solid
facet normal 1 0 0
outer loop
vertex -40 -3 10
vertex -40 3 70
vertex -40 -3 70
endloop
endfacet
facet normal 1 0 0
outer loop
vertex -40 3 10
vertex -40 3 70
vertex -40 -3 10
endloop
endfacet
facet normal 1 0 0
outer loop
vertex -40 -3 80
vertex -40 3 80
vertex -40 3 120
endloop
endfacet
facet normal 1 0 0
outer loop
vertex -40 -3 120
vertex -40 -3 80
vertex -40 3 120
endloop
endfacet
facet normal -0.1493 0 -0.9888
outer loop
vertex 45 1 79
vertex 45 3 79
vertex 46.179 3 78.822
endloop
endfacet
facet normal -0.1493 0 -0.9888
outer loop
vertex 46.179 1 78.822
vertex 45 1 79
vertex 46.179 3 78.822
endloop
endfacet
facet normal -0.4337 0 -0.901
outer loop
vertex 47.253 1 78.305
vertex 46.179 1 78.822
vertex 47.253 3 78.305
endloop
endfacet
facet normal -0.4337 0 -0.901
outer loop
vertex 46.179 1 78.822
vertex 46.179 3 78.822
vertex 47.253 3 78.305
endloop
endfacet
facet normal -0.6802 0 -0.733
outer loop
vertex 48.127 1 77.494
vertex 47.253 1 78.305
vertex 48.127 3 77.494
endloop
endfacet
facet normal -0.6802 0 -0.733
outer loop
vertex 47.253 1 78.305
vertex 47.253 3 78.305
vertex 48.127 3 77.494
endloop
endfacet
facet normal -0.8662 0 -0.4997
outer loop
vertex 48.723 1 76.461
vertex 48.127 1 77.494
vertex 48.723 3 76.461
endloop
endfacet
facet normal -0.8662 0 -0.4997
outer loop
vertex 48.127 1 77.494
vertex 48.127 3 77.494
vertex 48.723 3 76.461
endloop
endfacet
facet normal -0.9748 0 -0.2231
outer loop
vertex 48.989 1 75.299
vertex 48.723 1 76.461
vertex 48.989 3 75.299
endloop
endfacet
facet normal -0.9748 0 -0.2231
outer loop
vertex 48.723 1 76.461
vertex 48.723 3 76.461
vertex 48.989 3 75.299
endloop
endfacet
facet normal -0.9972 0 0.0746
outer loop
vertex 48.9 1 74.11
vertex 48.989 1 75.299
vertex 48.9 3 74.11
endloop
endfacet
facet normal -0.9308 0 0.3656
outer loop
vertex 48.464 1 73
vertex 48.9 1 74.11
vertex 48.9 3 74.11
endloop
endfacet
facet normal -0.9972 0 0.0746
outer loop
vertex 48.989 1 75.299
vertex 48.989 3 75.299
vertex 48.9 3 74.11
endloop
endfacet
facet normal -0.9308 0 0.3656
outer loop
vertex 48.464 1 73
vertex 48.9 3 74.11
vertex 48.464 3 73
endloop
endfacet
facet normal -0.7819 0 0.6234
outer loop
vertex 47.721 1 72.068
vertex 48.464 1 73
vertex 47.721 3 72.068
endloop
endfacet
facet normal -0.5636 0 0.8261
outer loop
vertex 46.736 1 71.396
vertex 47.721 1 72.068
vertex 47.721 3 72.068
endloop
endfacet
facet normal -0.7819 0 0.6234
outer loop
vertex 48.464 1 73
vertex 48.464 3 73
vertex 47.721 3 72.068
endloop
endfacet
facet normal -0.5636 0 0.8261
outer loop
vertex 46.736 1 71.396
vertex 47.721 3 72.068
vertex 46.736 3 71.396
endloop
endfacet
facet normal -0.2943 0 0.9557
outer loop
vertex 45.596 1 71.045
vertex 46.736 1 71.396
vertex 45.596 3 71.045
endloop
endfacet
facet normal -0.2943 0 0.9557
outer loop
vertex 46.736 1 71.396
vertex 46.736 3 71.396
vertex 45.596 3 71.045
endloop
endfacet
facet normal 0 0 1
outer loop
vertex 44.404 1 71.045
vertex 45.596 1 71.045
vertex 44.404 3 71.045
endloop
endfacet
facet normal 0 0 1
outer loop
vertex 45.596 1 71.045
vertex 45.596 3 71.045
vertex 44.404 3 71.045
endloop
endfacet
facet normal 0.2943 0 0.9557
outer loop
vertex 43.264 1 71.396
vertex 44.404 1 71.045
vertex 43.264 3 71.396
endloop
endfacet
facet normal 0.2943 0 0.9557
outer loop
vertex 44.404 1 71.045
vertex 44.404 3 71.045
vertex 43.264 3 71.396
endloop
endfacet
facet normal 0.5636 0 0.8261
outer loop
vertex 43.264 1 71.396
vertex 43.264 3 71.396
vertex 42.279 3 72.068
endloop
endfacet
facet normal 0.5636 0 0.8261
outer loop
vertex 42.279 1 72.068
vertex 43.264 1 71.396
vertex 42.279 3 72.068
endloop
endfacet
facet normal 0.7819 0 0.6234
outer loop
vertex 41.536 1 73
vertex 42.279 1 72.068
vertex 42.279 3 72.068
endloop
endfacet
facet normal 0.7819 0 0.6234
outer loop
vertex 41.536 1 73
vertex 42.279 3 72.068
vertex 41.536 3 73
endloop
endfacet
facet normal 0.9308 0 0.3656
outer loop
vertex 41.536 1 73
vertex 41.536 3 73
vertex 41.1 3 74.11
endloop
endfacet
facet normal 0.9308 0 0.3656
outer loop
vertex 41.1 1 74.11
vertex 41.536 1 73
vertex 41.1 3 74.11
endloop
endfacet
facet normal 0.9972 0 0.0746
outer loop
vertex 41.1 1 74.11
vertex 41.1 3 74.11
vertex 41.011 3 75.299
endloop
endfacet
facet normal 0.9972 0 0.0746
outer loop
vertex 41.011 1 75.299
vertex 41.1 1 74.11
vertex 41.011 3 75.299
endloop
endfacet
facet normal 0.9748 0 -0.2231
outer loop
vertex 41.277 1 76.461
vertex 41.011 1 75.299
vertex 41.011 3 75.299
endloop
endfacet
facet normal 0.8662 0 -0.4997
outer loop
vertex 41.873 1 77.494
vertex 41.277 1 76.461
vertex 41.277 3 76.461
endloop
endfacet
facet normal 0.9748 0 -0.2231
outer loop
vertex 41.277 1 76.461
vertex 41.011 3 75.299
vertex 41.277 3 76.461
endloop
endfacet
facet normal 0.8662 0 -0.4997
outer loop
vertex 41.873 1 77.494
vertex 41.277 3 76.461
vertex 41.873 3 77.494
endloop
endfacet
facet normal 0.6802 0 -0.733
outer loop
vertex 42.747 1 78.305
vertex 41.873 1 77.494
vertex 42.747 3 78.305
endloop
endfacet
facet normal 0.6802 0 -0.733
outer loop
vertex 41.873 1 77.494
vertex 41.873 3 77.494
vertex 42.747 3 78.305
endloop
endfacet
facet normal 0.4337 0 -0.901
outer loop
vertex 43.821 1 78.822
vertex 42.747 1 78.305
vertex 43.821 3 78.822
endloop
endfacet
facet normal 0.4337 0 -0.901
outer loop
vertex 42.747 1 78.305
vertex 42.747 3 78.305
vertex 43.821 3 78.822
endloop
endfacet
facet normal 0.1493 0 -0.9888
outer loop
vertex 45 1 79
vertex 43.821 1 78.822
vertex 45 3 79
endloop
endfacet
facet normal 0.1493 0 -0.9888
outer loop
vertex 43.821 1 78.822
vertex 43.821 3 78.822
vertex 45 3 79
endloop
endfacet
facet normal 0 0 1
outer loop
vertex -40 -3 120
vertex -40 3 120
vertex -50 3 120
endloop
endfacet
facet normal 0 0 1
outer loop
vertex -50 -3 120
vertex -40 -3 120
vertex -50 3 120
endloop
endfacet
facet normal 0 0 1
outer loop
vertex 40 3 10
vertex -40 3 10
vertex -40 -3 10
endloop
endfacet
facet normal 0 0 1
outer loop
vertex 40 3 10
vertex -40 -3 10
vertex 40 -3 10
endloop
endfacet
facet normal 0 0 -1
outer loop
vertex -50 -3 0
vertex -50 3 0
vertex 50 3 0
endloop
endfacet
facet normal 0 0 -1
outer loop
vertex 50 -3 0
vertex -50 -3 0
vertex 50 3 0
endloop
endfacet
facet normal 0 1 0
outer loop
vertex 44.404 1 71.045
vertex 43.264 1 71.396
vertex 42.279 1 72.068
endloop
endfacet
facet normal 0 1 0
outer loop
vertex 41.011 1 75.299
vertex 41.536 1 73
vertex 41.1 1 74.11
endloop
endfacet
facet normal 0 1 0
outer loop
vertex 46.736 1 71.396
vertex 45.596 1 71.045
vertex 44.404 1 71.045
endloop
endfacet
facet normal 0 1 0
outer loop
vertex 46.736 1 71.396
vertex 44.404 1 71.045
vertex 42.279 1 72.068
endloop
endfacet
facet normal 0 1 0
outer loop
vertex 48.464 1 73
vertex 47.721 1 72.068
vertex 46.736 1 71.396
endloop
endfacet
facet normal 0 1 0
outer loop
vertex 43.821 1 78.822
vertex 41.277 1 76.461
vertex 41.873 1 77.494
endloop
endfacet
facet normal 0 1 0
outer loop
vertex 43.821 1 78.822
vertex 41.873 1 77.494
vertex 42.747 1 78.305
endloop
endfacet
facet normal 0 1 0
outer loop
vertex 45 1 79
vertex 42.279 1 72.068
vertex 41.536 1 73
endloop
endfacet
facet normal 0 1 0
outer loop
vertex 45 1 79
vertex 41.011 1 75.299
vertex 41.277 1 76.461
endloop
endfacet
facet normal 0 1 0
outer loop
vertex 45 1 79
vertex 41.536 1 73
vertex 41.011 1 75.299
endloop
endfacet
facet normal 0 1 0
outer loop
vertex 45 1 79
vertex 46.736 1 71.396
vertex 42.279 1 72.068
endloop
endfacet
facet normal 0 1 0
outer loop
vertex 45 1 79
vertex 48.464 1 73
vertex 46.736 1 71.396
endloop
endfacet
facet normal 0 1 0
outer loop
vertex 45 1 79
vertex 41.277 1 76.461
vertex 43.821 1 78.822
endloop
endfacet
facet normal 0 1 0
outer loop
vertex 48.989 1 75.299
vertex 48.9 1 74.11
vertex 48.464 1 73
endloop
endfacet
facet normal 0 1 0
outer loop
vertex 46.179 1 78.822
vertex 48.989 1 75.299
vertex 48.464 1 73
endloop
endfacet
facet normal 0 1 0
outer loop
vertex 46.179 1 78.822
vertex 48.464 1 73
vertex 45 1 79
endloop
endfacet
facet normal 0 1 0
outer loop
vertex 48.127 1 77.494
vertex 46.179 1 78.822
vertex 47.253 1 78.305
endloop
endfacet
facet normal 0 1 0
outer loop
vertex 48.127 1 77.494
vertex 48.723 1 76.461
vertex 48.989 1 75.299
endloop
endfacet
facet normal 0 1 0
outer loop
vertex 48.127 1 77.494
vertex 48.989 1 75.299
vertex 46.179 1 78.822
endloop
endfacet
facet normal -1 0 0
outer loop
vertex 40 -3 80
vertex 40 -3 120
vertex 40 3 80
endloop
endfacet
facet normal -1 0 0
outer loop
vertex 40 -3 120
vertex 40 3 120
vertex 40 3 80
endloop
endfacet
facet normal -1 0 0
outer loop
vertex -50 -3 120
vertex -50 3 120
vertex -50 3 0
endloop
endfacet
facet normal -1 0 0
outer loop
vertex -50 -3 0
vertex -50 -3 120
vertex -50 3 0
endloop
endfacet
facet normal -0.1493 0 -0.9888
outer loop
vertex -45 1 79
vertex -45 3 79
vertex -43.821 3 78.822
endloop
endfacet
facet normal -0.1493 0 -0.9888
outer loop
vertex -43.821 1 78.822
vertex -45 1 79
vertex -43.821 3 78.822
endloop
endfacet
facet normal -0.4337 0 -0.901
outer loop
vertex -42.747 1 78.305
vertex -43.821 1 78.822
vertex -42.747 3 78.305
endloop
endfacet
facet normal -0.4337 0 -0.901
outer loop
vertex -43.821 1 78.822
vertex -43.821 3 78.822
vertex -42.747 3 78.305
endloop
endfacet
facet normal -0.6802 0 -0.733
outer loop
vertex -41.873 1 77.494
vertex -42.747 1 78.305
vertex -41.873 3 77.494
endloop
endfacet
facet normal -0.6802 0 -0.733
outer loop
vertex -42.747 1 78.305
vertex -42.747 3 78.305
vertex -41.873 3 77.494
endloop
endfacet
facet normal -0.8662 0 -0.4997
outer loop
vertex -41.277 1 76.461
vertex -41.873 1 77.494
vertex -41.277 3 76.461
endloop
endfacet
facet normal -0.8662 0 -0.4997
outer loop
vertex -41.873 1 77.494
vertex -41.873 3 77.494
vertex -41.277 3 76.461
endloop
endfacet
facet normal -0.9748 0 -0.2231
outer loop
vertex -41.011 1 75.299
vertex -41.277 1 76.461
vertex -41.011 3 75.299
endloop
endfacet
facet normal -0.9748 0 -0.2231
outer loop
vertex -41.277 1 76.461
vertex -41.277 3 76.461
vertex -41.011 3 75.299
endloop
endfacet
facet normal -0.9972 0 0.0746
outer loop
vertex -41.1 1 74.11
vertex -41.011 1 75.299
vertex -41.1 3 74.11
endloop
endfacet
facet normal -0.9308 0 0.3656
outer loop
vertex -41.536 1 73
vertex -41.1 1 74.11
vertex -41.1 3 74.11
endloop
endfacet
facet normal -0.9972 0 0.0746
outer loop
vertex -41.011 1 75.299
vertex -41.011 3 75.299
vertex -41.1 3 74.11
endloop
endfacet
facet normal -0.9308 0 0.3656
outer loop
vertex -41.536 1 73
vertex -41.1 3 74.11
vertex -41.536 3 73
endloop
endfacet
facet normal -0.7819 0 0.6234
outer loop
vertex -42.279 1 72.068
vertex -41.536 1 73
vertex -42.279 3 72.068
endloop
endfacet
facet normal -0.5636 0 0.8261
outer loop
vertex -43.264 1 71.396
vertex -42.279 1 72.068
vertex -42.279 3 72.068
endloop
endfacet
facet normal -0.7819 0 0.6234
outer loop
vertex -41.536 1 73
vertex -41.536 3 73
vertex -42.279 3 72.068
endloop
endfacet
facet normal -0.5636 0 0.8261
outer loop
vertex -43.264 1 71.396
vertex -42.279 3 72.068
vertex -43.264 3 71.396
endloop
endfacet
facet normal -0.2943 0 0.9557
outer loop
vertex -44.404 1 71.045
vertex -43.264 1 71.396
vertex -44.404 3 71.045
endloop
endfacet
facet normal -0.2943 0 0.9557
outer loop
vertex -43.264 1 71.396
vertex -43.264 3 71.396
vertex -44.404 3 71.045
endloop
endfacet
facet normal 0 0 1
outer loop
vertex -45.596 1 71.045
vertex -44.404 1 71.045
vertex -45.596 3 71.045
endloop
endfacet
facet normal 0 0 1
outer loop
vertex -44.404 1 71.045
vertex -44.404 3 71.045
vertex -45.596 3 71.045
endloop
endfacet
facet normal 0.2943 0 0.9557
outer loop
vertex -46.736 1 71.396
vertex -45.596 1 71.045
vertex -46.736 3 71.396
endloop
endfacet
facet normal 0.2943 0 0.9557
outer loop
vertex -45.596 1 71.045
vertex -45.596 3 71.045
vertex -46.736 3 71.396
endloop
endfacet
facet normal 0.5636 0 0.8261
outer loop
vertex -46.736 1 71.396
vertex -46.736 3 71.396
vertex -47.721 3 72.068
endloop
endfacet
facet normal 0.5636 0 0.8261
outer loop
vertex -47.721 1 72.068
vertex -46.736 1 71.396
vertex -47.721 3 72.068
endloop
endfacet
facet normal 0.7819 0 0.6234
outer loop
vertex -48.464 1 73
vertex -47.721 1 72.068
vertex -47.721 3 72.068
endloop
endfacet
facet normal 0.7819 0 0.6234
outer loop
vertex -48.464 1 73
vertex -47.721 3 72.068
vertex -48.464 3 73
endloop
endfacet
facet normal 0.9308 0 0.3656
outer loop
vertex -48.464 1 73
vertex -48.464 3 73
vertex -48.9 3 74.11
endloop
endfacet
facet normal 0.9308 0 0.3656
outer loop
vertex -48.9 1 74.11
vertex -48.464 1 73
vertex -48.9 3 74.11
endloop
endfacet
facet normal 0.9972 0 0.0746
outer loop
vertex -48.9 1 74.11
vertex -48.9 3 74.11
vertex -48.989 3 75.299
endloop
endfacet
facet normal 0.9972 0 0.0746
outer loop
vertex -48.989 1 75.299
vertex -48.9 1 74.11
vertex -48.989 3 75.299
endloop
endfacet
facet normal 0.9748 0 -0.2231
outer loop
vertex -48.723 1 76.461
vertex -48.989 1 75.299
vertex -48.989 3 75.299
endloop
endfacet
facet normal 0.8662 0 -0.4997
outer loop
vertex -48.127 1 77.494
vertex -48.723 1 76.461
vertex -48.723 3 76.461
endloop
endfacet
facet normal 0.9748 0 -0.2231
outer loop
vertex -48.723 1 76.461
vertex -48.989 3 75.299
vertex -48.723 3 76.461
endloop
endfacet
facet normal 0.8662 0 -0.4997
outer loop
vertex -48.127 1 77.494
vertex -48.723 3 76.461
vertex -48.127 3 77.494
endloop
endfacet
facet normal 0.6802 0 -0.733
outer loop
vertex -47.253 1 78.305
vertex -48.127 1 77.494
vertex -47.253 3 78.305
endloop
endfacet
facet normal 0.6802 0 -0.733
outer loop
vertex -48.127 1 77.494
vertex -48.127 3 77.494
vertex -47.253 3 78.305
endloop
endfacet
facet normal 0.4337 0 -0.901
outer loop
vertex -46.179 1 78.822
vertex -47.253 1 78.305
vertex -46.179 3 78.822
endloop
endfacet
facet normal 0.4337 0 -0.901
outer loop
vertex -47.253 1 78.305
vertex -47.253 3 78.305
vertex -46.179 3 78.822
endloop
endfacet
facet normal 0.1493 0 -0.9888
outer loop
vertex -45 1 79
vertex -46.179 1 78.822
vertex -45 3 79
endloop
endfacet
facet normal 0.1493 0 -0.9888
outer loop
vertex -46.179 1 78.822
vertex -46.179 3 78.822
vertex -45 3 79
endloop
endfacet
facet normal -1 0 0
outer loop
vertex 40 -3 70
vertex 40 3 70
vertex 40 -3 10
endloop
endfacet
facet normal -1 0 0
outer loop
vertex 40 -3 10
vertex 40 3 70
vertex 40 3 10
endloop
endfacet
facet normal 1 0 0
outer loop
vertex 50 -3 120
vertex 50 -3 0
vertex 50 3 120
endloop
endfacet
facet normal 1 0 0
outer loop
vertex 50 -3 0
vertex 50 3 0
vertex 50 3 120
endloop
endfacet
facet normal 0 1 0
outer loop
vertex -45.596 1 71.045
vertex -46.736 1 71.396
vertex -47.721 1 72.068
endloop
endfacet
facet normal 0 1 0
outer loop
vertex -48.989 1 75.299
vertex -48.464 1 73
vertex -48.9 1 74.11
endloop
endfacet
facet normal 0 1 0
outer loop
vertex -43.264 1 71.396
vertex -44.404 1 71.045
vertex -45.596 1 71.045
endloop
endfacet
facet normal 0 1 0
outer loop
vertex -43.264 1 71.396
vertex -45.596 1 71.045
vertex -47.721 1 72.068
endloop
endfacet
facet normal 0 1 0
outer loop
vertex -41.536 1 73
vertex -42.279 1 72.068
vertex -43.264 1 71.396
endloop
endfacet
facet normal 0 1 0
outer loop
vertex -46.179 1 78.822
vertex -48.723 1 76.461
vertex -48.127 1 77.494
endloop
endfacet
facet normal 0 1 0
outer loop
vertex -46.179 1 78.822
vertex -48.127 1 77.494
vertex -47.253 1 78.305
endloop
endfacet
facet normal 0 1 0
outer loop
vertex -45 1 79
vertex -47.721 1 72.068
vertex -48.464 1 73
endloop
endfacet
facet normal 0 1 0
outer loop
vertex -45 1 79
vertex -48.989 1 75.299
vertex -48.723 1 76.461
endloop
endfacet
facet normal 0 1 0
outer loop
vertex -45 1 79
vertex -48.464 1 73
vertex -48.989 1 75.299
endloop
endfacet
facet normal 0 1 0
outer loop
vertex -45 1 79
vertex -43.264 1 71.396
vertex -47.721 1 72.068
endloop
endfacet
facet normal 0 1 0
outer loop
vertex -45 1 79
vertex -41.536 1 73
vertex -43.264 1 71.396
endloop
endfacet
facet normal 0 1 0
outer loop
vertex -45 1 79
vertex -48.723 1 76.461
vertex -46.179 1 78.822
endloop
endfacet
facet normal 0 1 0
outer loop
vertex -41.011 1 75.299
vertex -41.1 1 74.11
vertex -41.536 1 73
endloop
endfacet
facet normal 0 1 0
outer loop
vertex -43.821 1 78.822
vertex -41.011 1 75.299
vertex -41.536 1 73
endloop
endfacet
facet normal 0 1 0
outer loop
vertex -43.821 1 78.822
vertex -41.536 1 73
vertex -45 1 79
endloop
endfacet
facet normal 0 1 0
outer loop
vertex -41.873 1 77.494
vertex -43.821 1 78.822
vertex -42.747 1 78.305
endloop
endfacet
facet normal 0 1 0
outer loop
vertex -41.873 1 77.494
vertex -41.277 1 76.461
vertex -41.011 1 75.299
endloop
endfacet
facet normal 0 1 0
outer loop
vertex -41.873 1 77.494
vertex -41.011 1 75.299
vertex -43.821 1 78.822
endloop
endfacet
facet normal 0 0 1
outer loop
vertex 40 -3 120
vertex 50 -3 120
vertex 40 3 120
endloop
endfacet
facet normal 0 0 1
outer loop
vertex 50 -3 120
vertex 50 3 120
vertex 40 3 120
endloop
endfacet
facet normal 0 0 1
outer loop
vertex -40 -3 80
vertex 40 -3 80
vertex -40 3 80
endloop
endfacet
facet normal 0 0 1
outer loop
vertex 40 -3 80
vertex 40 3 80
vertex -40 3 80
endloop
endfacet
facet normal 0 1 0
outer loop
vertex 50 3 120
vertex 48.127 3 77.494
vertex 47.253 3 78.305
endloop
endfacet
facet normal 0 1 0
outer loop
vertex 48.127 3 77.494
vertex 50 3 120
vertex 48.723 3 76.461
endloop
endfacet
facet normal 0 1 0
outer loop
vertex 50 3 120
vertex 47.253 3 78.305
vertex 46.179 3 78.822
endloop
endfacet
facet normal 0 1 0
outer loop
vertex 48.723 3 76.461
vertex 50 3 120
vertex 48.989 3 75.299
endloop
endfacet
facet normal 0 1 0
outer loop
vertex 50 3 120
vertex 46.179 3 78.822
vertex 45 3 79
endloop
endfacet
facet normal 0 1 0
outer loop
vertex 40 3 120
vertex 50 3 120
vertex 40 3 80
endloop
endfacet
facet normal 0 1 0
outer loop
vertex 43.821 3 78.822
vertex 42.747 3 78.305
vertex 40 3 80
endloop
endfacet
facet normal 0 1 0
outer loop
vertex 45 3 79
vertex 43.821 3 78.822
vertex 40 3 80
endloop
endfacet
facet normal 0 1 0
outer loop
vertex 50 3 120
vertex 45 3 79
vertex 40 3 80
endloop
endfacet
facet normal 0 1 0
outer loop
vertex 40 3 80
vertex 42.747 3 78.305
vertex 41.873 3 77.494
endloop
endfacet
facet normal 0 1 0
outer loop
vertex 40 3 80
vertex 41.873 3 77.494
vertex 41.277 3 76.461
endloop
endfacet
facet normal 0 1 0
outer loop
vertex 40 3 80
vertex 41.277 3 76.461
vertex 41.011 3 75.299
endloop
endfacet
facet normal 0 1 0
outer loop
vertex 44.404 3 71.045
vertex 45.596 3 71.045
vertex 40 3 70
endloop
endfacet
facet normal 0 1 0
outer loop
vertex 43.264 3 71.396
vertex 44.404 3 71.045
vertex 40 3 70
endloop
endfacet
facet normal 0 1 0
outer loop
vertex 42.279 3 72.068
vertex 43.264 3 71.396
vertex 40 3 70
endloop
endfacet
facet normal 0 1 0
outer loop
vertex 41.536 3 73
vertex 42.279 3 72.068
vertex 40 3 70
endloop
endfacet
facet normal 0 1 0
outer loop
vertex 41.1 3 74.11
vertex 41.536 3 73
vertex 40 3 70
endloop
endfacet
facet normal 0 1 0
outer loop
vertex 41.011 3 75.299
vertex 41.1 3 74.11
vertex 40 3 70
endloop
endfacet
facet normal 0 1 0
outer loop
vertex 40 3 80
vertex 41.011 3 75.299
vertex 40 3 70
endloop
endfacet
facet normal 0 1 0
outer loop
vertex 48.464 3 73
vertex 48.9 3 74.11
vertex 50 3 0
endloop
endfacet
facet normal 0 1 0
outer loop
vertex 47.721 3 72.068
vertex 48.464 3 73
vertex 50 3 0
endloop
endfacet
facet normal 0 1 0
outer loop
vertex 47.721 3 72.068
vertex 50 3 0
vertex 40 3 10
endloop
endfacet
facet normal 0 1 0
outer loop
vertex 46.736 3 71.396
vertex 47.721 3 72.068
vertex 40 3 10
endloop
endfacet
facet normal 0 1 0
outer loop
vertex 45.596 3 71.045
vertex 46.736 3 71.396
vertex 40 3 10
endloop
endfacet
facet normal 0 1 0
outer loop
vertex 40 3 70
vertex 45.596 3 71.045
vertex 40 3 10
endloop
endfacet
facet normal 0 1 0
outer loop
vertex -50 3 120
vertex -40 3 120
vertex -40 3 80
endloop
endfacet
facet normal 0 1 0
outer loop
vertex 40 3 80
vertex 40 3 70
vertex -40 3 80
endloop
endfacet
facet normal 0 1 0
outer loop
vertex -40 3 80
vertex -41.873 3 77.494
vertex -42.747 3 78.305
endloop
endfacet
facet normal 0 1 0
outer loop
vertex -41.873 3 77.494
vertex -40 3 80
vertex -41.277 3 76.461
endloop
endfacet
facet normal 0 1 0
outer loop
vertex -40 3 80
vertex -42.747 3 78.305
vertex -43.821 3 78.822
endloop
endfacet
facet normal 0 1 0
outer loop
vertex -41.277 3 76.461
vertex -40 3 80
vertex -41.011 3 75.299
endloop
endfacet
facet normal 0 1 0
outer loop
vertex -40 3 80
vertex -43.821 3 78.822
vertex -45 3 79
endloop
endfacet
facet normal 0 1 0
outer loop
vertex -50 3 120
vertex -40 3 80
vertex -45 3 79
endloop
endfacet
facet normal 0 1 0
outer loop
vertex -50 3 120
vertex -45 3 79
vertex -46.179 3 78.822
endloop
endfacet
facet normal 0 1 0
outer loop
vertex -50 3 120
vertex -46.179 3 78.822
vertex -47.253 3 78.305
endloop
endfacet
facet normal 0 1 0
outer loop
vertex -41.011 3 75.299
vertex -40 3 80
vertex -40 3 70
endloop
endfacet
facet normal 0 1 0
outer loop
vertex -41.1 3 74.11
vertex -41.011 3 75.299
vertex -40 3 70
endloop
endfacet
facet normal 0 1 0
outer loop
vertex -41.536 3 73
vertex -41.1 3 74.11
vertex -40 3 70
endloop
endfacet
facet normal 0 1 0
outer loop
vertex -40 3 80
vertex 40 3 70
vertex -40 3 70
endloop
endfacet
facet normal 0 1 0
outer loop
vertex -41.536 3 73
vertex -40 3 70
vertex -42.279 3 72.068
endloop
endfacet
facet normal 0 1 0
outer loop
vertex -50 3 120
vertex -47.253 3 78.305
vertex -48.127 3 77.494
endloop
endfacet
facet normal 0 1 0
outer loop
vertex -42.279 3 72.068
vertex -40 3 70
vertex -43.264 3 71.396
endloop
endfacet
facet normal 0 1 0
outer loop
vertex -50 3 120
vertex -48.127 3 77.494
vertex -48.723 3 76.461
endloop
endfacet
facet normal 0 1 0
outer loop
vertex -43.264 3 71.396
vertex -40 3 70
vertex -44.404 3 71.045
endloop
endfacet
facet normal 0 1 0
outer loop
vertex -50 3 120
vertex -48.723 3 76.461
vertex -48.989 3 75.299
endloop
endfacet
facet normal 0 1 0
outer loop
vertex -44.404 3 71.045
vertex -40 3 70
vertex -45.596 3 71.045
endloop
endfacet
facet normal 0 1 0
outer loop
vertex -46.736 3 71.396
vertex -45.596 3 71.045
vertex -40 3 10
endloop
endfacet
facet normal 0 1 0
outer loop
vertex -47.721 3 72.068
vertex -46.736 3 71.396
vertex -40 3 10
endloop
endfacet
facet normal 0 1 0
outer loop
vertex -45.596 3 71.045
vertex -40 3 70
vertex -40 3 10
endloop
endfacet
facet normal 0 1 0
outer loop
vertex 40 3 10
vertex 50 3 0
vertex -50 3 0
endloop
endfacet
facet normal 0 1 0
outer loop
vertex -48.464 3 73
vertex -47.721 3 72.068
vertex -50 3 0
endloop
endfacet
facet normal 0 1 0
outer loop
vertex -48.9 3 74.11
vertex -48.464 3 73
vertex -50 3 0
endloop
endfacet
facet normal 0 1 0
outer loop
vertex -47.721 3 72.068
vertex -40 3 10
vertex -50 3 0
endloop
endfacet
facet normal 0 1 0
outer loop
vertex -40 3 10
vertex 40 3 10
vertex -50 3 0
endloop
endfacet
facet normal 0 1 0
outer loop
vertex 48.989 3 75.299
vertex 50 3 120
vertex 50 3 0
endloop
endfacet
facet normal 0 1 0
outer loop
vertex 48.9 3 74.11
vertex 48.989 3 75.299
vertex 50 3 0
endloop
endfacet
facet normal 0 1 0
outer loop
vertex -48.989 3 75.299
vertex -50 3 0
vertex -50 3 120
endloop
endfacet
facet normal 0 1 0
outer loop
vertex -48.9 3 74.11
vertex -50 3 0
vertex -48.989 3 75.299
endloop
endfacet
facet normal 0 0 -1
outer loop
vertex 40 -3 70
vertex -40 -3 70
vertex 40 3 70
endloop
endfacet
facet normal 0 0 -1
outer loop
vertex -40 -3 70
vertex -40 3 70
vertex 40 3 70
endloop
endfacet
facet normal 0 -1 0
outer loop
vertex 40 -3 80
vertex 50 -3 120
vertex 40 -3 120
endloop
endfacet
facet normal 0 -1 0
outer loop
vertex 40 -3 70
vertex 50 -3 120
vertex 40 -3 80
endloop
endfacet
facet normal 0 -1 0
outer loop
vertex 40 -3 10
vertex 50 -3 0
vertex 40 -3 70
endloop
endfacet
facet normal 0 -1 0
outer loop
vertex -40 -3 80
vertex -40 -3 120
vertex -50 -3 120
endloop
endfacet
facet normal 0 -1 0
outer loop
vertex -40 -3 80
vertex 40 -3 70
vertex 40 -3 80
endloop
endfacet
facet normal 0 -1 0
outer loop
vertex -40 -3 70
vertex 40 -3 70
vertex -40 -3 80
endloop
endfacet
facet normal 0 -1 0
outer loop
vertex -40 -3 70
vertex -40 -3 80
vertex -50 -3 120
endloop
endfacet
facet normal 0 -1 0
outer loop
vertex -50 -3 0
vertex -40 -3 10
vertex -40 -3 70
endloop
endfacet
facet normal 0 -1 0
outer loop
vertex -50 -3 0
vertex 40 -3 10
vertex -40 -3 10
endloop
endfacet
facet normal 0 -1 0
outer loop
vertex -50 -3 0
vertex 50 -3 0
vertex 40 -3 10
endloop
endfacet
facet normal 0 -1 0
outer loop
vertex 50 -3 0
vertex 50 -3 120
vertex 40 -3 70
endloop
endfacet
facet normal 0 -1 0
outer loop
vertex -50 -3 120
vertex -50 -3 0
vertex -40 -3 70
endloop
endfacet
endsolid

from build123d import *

# Parameters (mm, degrees)
SKETCH1_W           = 80
SKETCH1_H           = 60
BOSS_EXTRUDE1_DEPTH = 3
SKETCH2_R           = 4
CUT_EXTRUDE1_DEPTH  = 2


with BuildPart() as part:
    # Sketch1 → Boss-Extrude1 (new, symmetric)
    with BuildSketch(Plane(origin=(0, 0, 0), x_dir=(1, 0, 0), z_dir=(0, 1, 0))):
        Polygon((-50, 0), (50, 0), (50, -120), (40, -120), (40, -80), (-40, -80), (-40, -120), (-50, -120), align=None)
        with Locations((0, -40)):
            Rectangle(SKETCH1_W, SKETCH1_H, mode=Mode.SUBTRACT)
    extrude(amount=BOSS_EXTRUDE1_DEPTH, both=True)

    # Sketch2 → Cut-Extrude1 (cut)
    with BuildSketch(Plane(origin=(0, 3, 0), x_dir=(1, 0, 0), z_dir=(0, 1, 0))):
        with Locations(Location((-45, -75, 0), (0, 0, 270))):
            Circle(SKETCH2_R)
        with Locations(Location((45, -75, 0), (0, 0, 270))):
            Circle(SKETCH2_R)
    extrude(amount=-CUT_EXTRUDE1_DEPTH, mode=Mode.SUBTRACT)


solid = part.part
